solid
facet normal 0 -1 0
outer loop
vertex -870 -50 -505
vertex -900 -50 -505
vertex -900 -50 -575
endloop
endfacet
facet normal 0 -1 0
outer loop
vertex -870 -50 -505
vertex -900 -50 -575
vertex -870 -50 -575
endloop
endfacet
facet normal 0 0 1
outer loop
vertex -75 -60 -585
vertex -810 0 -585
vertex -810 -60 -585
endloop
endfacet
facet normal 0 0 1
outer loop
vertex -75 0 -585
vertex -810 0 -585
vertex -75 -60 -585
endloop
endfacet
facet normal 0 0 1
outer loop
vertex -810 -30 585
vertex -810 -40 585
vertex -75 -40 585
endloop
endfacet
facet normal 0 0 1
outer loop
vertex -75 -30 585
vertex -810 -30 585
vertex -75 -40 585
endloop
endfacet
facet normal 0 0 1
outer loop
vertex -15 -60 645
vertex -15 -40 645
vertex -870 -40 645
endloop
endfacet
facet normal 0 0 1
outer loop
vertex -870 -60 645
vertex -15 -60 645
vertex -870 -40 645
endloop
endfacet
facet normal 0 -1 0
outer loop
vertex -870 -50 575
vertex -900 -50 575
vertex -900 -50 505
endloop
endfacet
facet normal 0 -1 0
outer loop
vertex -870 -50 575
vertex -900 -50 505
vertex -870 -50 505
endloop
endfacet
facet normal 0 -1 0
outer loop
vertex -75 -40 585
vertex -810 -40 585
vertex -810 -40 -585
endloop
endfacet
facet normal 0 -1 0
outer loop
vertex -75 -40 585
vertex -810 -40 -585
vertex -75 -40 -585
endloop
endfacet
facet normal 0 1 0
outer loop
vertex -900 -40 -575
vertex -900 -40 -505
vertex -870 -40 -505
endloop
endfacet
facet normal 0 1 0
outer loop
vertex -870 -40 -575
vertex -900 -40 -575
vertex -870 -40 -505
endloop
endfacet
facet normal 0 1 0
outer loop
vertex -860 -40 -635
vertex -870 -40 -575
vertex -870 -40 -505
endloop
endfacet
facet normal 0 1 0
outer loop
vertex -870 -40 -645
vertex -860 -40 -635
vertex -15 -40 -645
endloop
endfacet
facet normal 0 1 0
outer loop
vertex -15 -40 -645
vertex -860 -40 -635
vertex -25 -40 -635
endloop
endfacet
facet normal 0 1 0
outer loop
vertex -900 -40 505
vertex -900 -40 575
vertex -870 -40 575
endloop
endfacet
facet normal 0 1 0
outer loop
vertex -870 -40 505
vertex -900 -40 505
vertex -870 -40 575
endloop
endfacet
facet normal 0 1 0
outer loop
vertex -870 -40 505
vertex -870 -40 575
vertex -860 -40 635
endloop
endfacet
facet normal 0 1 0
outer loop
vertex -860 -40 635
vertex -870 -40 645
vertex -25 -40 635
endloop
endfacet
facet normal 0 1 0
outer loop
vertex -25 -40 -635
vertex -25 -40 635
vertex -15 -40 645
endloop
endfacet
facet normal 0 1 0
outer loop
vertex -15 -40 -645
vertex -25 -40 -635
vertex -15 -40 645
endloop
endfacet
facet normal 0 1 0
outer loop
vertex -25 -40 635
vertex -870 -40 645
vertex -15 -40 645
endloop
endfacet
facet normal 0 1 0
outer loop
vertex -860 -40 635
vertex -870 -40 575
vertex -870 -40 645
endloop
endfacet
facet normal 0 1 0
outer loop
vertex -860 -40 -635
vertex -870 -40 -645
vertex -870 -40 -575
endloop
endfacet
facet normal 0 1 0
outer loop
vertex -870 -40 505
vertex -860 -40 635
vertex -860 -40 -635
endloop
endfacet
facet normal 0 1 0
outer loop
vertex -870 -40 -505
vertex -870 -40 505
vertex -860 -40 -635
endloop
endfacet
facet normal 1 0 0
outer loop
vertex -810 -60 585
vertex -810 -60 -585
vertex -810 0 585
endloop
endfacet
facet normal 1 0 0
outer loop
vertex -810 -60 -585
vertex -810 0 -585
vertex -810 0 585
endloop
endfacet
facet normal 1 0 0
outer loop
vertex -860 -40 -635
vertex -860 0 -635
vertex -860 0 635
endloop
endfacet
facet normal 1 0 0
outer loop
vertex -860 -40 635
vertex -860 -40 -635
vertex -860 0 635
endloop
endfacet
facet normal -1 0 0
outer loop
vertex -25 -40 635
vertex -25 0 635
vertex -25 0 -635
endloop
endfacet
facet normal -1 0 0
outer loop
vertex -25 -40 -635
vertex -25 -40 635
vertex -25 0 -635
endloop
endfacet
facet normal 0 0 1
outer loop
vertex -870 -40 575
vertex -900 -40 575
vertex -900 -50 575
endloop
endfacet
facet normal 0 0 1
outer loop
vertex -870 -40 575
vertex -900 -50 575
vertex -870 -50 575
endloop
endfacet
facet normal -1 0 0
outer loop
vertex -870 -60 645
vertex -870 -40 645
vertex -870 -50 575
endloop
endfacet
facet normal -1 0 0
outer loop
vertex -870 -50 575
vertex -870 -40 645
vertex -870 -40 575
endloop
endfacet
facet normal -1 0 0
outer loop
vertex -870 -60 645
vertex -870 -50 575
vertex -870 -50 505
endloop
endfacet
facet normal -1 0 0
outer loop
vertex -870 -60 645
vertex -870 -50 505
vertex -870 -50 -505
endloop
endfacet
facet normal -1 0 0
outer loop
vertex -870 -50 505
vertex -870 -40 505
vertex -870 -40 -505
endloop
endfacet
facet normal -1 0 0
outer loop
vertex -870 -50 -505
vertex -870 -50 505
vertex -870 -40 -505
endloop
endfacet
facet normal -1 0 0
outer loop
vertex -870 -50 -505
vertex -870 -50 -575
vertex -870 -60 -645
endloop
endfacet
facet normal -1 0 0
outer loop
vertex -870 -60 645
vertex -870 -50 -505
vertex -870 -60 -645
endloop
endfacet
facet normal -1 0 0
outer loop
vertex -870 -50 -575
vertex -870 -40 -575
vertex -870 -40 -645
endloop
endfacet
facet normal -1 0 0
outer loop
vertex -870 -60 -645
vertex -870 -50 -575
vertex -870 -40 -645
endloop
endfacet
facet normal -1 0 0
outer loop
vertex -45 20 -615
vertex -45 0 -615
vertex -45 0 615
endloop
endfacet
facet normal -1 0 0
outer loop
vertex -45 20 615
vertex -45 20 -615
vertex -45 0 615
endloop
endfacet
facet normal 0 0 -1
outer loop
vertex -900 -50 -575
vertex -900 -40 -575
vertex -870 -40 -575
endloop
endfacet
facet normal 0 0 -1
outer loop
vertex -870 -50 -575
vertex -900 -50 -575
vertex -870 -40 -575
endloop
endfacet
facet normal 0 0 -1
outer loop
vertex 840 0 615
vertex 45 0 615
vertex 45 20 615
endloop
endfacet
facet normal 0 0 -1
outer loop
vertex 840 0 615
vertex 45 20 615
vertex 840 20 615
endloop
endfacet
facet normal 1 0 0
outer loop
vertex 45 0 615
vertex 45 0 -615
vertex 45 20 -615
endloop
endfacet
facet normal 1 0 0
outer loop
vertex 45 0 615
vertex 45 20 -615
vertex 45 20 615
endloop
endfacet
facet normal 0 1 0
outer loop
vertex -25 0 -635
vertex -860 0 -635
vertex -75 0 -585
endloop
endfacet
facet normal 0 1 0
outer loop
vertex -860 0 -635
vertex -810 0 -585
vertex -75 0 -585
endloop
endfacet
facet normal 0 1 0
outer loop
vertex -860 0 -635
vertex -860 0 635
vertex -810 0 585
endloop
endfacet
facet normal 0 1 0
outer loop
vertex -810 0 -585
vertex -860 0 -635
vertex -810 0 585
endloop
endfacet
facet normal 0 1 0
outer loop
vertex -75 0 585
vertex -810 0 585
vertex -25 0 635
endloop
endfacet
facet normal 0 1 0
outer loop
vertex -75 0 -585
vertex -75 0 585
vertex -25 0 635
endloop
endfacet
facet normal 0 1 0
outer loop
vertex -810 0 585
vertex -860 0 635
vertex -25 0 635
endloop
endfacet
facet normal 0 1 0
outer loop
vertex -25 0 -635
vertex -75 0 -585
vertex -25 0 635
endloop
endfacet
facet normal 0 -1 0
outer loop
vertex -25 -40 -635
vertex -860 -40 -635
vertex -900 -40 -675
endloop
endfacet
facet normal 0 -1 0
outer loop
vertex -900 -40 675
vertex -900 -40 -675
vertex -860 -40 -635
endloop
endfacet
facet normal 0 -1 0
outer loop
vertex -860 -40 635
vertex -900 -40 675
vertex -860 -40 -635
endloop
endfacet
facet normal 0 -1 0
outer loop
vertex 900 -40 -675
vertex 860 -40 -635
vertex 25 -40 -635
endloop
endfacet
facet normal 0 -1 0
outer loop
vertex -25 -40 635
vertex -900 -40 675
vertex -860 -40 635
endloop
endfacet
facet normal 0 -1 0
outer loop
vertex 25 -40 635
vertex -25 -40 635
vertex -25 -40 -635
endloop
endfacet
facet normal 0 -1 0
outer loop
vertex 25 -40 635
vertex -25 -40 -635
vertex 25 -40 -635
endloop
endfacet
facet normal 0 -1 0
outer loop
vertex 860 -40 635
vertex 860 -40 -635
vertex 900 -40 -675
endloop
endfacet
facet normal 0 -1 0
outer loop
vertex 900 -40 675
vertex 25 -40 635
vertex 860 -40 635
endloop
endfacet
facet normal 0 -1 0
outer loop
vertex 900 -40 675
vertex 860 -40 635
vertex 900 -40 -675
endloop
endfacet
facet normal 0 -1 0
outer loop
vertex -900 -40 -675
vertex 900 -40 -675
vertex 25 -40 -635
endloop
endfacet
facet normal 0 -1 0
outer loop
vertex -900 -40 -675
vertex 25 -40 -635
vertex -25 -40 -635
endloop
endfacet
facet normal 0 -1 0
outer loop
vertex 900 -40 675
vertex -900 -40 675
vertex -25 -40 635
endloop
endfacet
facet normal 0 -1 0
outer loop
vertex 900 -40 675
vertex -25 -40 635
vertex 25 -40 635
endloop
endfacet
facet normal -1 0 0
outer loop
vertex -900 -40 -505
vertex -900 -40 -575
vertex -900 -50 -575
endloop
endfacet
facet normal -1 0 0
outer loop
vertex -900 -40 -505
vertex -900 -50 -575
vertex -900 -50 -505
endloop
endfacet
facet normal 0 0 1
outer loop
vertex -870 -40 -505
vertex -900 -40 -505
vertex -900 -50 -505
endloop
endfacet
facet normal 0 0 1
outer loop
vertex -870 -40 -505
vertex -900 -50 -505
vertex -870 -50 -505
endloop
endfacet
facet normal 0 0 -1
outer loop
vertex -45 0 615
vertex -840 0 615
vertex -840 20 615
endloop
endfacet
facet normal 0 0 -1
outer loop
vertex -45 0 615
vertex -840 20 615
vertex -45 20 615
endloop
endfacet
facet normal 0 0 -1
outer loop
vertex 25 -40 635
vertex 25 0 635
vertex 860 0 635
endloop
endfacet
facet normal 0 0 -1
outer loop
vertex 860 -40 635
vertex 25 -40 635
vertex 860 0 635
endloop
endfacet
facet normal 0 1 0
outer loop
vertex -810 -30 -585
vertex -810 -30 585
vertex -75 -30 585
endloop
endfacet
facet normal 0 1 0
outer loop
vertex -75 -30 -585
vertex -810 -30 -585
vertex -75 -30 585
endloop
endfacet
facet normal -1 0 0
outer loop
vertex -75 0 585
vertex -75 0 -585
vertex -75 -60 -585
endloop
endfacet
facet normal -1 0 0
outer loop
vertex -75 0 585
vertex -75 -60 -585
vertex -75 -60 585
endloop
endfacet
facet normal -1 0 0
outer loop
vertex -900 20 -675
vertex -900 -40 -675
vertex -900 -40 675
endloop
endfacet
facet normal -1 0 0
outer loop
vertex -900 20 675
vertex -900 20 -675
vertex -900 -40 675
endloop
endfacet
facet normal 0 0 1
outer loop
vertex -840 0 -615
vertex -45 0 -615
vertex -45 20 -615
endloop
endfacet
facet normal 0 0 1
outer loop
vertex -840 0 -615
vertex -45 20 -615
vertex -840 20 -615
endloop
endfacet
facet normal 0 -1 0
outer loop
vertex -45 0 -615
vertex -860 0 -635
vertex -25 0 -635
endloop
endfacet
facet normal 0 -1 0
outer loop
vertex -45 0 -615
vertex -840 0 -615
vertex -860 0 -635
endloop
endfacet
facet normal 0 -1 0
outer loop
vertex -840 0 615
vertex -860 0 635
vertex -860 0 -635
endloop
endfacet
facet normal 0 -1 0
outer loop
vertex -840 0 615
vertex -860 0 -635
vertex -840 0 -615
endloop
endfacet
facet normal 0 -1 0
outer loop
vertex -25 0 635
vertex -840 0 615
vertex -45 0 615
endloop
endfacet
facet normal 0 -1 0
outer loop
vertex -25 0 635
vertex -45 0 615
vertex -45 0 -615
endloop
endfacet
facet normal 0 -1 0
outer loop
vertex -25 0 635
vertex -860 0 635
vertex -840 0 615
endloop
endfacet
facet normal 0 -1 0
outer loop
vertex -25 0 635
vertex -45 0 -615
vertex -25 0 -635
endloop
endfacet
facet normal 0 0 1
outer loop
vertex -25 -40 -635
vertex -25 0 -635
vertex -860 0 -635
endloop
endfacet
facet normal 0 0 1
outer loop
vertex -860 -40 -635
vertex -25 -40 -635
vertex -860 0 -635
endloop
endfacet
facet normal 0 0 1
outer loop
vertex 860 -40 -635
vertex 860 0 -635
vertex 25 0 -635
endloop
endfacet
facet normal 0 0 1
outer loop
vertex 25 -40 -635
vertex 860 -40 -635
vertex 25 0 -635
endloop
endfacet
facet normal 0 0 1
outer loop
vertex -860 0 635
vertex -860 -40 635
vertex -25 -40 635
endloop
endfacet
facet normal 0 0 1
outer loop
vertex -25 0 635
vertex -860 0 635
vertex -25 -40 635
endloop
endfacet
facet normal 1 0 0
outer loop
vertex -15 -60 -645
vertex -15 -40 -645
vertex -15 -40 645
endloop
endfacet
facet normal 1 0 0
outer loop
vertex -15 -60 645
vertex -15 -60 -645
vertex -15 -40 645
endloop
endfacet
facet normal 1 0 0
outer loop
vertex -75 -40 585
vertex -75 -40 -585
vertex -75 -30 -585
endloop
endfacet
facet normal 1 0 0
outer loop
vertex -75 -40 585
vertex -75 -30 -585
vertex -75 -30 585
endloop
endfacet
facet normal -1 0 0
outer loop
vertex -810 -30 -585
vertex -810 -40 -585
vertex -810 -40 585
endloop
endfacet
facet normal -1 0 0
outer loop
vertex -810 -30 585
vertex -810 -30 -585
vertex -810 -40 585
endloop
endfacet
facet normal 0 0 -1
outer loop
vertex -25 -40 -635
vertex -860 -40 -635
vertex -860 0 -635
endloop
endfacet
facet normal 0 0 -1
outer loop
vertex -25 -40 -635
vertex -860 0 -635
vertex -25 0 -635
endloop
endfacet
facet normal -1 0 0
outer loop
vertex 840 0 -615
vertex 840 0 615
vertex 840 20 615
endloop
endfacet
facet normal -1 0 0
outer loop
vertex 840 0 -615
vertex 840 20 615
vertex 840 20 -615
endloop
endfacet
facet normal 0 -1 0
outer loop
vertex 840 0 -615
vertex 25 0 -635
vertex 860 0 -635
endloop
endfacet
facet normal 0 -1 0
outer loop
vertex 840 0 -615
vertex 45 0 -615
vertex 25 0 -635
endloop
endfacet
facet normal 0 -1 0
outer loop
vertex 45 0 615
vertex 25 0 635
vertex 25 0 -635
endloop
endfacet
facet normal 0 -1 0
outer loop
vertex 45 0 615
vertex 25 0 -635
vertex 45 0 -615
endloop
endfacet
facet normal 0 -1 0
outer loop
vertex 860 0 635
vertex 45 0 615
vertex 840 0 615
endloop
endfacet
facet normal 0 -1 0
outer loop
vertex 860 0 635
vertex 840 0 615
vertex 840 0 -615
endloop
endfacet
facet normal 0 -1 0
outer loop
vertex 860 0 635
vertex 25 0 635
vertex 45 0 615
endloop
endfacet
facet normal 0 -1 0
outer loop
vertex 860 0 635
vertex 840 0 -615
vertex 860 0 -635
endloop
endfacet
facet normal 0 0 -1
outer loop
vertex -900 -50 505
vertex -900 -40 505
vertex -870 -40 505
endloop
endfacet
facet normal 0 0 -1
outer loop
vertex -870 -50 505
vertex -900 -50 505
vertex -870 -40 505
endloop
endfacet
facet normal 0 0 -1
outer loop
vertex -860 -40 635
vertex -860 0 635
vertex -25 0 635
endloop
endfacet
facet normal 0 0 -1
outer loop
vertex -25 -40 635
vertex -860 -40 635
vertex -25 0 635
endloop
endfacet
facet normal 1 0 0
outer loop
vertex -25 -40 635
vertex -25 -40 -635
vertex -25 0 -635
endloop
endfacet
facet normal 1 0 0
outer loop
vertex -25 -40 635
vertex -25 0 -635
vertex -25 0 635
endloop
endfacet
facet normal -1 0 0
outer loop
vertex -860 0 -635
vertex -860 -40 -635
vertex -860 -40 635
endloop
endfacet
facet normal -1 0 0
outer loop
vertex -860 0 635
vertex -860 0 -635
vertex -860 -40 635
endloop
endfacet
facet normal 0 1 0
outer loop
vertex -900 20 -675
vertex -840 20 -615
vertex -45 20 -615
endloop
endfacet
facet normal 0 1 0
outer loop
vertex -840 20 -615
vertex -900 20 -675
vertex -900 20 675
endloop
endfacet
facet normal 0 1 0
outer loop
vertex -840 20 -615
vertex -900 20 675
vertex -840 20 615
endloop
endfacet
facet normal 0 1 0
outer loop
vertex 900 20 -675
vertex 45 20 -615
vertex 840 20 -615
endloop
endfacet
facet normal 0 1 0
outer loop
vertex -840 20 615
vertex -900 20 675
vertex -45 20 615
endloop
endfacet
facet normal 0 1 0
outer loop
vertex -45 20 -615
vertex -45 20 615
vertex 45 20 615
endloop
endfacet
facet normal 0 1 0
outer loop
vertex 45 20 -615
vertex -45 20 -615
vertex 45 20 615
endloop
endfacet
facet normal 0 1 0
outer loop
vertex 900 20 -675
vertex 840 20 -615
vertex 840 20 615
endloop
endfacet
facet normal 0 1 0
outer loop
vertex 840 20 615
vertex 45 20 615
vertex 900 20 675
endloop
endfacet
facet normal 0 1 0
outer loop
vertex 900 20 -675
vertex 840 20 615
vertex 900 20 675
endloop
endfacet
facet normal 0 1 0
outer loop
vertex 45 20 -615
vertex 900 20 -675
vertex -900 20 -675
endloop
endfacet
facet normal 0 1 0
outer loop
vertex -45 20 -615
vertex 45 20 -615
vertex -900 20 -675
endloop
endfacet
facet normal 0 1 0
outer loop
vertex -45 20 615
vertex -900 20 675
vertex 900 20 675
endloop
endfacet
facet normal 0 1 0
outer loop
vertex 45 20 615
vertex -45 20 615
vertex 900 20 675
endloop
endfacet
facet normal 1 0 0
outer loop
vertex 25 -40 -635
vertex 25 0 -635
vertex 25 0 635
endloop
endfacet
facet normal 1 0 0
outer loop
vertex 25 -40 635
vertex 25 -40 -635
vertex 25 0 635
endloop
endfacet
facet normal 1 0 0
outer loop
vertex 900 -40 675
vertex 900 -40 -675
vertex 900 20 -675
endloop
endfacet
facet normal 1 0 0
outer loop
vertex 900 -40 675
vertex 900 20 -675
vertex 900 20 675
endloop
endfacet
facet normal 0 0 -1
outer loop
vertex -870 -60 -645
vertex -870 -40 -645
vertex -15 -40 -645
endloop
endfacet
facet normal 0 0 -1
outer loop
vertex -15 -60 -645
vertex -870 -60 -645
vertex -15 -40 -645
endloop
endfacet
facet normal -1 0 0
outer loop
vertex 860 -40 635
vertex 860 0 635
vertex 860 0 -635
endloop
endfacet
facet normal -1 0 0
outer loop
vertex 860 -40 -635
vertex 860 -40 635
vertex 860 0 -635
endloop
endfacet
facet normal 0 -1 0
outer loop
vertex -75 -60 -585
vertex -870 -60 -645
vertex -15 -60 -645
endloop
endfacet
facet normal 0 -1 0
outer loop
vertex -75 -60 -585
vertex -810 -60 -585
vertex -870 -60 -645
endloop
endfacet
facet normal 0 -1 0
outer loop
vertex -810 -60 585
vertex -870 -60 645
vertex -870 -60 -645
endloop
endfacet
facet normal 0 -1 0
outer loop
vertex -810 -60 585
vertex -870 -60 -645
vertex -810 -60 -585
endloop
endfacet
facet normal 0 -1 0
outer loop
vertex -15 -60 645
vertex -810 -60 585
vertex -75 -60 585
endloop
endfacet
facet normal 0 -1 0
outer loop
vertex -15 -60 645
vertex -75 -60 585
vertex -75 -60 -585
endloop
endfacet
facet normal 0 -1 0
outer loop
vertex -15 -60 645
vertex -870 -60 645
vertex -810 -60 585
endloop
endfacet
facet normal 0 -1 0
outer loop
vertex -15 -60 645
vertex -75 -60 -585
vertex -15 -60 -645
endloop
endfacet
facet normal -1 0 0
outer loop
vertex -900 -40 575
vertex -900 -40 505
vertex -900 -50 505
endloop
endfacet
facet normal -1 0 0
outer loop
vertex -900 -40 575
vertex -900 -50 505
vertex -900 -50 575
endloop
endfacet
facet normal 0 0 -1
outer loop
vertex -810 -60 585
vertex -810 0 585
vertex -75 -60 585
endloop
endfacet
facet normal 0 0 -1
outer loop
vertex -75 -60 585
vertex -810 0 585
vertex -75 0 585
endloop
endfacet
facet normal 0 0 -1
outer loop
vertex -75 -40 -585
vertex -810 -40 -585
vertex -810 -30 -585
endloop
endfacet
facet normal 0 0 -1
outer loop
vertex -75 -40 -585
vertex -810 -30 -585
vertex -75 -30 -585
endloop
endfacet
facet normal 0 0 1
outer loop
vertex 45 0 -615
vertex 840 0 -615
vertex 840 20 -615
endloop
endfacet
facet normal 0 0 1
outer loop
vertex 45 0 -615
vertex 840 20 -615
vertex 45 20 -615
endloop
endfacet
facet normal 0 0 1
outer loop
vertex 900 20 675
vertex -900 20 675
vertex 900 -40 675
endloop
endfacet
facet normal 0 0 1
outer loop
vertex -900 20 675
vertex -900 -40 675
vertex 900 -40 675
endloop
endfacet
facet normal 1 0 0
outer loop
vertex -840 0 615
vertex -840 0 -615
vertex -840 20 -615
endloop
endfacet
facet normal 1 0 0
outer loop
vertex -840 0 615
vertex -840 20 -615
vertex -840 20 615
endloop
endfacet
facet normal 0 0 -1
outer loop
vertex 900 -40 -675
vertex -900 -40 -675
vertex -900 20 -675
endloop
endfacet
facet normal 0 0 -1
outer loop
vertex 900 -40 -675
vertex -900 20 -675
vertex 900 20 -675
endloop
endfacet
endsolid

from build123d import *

# Parameters (mm, degrees)
F0_W          = 1800
F0_H          = 1350
F1_DEPTH      = 40
F0_W_2        = 50
F0_H_2        = 1230
F0_W_3        = 20
F0_H_3        = 20
F2_DEPTH      = 20
F3_DEPTH      = 40
F3_DEPTH_BACK = 20
F4_W          = 835
F4_H          = 1270
F4_W_2        = 735
F4_H_2        = 1170
F5_DEPTH      = 40
F6_DEPTH      = 20
F7_DEPTH      = 10
F4_W_3        = 30
F4_H_3        = 70
F8_DEPTH      = 10


with BuildPart() as f1:
    # F0 (on Front) → F1 (new body)
    with BuildSketch(Plane.XZ):
        Rectangle(F0_W, F0_H)
        Polygon((-860, -635), (-860, 635), (-25, 635), (25, 635), (860, 635), (860, -635), (25, -635), (-25, -635), align=None, mode=Mode.SUBTRACT)
    extrude(amount=F1_DEPTH)

    # F0 (on Front) → F2 (join)
    with BuildSketch(Plane.XZ):
        Rectangle(F0_W, F0_H)
        Polygon((-860, -635), (-860, 635), (-25, 635), (25, 635), (860, 635), (860, -635), (25, -635), (-25, -635), align=None, mode=Mode.SUBTRACT)
        Rectangle(F0_W_2, F0_H_2)
        Polygon((-25, 635), (-860, 635), (-860, -635), (-25, -635), (-25, -615), (-45, -615), (-840, -615), (-840, 615), (-45, 615), (-25, 615), align=None)
        Polygon((860, 635), (25, 635), (25, 615), (45, 615), (840, 615), (840, -615), (45, -615), (25, -615), (25, -635), (860, -635), align=None)
        with Locations((35, 0)):
            Rectangle(F0_W_3, F0_H_2)
        with Locations((-35, 0)):
            Rectangle(F0_W_3, F0_H_2)
        with Locations((0, -625)):
            Rectangle(F0_W_2, F0_H_3)
        with Locations((0, 625)):
            Rectangle(F0_W_2, F0_H_3)
    extrude(amount=-F2_DEPTH)

    # F0 (on Front) → F3 (join, two sides)
    with BuildSketch(Plane.XZ) as f3_sk:
        Rectangle(F0_W_2, F0_H_2)
        with Locations((0, 625)):
            Rectangle(F0_W_2, F0_H_3)
        with Locations((0, -625)):
            Rectangle(F0_W_2, F0_H_3)
    extrude(amount=F3_DEPTH)
    extrude(f3_sk.sketch, amount=-F3_DEPTH_BACK)


with BuildPart() as f5:
    # F4 (on face) → F5 (new body, through all)
    with BuildSketch(Plane.XZ.offset(40)):
        with Locations((-442.5, 0)):
            Rectangle(F4_W, F4_H)
        with Locations((-442.5, 0)):
            Rectangle(F4_W_2, F4_H_2, mode=Mode.SUBTRACT)
    extrude(amount=-F5_DEPTH)

    # F4 (on face) → F6 (join)
    with BuildSketch(Plane.XZ.offset(40)):
        Polygon((-870, -575), (-870, -645), (-15, -645), (-15, 645), (-870, 645), (-870, 575), (-870, 505), (-870, -505), align=None)
        with Locations((-442.5, 0)):
            Rectangle(F4_W, F4_H, mode=Mode.SUBTRACT)
        with Locations((-442.5, 0)):
            Rectangle(F4_W, F4_H)
        with Locations((-442.5, 0)):
            Rectangle(F4_W_2, F4_H_2, mode=Mode.SUBTRACT)
    extrude(amount=F6_DEPTH)

    # F4 (on face) → F8 (join)
    with BuildSketch(Plane.XZ.offset(40)):
        with Locations((-885, 540)):
            Rectangle(F4_W_3, F4_H_3)
        with Locations((-885, -540)):
            Rectangle(F4_W_3, F4_H_3)
    extrude(amount=F8_DEPTH)


with BuildPart() as f7:
    # F4 (on face) → F7 (new body)
    with BuildSketch(Plane.XZ.offset(40)):
        with Locations((-442.5, 0)):
            Rectangle(F4_W_2, F4_H_2)
    extrude(amount=-F7_DEPTH)


solid = Compound([f1.part, f5.part, f7.part])
